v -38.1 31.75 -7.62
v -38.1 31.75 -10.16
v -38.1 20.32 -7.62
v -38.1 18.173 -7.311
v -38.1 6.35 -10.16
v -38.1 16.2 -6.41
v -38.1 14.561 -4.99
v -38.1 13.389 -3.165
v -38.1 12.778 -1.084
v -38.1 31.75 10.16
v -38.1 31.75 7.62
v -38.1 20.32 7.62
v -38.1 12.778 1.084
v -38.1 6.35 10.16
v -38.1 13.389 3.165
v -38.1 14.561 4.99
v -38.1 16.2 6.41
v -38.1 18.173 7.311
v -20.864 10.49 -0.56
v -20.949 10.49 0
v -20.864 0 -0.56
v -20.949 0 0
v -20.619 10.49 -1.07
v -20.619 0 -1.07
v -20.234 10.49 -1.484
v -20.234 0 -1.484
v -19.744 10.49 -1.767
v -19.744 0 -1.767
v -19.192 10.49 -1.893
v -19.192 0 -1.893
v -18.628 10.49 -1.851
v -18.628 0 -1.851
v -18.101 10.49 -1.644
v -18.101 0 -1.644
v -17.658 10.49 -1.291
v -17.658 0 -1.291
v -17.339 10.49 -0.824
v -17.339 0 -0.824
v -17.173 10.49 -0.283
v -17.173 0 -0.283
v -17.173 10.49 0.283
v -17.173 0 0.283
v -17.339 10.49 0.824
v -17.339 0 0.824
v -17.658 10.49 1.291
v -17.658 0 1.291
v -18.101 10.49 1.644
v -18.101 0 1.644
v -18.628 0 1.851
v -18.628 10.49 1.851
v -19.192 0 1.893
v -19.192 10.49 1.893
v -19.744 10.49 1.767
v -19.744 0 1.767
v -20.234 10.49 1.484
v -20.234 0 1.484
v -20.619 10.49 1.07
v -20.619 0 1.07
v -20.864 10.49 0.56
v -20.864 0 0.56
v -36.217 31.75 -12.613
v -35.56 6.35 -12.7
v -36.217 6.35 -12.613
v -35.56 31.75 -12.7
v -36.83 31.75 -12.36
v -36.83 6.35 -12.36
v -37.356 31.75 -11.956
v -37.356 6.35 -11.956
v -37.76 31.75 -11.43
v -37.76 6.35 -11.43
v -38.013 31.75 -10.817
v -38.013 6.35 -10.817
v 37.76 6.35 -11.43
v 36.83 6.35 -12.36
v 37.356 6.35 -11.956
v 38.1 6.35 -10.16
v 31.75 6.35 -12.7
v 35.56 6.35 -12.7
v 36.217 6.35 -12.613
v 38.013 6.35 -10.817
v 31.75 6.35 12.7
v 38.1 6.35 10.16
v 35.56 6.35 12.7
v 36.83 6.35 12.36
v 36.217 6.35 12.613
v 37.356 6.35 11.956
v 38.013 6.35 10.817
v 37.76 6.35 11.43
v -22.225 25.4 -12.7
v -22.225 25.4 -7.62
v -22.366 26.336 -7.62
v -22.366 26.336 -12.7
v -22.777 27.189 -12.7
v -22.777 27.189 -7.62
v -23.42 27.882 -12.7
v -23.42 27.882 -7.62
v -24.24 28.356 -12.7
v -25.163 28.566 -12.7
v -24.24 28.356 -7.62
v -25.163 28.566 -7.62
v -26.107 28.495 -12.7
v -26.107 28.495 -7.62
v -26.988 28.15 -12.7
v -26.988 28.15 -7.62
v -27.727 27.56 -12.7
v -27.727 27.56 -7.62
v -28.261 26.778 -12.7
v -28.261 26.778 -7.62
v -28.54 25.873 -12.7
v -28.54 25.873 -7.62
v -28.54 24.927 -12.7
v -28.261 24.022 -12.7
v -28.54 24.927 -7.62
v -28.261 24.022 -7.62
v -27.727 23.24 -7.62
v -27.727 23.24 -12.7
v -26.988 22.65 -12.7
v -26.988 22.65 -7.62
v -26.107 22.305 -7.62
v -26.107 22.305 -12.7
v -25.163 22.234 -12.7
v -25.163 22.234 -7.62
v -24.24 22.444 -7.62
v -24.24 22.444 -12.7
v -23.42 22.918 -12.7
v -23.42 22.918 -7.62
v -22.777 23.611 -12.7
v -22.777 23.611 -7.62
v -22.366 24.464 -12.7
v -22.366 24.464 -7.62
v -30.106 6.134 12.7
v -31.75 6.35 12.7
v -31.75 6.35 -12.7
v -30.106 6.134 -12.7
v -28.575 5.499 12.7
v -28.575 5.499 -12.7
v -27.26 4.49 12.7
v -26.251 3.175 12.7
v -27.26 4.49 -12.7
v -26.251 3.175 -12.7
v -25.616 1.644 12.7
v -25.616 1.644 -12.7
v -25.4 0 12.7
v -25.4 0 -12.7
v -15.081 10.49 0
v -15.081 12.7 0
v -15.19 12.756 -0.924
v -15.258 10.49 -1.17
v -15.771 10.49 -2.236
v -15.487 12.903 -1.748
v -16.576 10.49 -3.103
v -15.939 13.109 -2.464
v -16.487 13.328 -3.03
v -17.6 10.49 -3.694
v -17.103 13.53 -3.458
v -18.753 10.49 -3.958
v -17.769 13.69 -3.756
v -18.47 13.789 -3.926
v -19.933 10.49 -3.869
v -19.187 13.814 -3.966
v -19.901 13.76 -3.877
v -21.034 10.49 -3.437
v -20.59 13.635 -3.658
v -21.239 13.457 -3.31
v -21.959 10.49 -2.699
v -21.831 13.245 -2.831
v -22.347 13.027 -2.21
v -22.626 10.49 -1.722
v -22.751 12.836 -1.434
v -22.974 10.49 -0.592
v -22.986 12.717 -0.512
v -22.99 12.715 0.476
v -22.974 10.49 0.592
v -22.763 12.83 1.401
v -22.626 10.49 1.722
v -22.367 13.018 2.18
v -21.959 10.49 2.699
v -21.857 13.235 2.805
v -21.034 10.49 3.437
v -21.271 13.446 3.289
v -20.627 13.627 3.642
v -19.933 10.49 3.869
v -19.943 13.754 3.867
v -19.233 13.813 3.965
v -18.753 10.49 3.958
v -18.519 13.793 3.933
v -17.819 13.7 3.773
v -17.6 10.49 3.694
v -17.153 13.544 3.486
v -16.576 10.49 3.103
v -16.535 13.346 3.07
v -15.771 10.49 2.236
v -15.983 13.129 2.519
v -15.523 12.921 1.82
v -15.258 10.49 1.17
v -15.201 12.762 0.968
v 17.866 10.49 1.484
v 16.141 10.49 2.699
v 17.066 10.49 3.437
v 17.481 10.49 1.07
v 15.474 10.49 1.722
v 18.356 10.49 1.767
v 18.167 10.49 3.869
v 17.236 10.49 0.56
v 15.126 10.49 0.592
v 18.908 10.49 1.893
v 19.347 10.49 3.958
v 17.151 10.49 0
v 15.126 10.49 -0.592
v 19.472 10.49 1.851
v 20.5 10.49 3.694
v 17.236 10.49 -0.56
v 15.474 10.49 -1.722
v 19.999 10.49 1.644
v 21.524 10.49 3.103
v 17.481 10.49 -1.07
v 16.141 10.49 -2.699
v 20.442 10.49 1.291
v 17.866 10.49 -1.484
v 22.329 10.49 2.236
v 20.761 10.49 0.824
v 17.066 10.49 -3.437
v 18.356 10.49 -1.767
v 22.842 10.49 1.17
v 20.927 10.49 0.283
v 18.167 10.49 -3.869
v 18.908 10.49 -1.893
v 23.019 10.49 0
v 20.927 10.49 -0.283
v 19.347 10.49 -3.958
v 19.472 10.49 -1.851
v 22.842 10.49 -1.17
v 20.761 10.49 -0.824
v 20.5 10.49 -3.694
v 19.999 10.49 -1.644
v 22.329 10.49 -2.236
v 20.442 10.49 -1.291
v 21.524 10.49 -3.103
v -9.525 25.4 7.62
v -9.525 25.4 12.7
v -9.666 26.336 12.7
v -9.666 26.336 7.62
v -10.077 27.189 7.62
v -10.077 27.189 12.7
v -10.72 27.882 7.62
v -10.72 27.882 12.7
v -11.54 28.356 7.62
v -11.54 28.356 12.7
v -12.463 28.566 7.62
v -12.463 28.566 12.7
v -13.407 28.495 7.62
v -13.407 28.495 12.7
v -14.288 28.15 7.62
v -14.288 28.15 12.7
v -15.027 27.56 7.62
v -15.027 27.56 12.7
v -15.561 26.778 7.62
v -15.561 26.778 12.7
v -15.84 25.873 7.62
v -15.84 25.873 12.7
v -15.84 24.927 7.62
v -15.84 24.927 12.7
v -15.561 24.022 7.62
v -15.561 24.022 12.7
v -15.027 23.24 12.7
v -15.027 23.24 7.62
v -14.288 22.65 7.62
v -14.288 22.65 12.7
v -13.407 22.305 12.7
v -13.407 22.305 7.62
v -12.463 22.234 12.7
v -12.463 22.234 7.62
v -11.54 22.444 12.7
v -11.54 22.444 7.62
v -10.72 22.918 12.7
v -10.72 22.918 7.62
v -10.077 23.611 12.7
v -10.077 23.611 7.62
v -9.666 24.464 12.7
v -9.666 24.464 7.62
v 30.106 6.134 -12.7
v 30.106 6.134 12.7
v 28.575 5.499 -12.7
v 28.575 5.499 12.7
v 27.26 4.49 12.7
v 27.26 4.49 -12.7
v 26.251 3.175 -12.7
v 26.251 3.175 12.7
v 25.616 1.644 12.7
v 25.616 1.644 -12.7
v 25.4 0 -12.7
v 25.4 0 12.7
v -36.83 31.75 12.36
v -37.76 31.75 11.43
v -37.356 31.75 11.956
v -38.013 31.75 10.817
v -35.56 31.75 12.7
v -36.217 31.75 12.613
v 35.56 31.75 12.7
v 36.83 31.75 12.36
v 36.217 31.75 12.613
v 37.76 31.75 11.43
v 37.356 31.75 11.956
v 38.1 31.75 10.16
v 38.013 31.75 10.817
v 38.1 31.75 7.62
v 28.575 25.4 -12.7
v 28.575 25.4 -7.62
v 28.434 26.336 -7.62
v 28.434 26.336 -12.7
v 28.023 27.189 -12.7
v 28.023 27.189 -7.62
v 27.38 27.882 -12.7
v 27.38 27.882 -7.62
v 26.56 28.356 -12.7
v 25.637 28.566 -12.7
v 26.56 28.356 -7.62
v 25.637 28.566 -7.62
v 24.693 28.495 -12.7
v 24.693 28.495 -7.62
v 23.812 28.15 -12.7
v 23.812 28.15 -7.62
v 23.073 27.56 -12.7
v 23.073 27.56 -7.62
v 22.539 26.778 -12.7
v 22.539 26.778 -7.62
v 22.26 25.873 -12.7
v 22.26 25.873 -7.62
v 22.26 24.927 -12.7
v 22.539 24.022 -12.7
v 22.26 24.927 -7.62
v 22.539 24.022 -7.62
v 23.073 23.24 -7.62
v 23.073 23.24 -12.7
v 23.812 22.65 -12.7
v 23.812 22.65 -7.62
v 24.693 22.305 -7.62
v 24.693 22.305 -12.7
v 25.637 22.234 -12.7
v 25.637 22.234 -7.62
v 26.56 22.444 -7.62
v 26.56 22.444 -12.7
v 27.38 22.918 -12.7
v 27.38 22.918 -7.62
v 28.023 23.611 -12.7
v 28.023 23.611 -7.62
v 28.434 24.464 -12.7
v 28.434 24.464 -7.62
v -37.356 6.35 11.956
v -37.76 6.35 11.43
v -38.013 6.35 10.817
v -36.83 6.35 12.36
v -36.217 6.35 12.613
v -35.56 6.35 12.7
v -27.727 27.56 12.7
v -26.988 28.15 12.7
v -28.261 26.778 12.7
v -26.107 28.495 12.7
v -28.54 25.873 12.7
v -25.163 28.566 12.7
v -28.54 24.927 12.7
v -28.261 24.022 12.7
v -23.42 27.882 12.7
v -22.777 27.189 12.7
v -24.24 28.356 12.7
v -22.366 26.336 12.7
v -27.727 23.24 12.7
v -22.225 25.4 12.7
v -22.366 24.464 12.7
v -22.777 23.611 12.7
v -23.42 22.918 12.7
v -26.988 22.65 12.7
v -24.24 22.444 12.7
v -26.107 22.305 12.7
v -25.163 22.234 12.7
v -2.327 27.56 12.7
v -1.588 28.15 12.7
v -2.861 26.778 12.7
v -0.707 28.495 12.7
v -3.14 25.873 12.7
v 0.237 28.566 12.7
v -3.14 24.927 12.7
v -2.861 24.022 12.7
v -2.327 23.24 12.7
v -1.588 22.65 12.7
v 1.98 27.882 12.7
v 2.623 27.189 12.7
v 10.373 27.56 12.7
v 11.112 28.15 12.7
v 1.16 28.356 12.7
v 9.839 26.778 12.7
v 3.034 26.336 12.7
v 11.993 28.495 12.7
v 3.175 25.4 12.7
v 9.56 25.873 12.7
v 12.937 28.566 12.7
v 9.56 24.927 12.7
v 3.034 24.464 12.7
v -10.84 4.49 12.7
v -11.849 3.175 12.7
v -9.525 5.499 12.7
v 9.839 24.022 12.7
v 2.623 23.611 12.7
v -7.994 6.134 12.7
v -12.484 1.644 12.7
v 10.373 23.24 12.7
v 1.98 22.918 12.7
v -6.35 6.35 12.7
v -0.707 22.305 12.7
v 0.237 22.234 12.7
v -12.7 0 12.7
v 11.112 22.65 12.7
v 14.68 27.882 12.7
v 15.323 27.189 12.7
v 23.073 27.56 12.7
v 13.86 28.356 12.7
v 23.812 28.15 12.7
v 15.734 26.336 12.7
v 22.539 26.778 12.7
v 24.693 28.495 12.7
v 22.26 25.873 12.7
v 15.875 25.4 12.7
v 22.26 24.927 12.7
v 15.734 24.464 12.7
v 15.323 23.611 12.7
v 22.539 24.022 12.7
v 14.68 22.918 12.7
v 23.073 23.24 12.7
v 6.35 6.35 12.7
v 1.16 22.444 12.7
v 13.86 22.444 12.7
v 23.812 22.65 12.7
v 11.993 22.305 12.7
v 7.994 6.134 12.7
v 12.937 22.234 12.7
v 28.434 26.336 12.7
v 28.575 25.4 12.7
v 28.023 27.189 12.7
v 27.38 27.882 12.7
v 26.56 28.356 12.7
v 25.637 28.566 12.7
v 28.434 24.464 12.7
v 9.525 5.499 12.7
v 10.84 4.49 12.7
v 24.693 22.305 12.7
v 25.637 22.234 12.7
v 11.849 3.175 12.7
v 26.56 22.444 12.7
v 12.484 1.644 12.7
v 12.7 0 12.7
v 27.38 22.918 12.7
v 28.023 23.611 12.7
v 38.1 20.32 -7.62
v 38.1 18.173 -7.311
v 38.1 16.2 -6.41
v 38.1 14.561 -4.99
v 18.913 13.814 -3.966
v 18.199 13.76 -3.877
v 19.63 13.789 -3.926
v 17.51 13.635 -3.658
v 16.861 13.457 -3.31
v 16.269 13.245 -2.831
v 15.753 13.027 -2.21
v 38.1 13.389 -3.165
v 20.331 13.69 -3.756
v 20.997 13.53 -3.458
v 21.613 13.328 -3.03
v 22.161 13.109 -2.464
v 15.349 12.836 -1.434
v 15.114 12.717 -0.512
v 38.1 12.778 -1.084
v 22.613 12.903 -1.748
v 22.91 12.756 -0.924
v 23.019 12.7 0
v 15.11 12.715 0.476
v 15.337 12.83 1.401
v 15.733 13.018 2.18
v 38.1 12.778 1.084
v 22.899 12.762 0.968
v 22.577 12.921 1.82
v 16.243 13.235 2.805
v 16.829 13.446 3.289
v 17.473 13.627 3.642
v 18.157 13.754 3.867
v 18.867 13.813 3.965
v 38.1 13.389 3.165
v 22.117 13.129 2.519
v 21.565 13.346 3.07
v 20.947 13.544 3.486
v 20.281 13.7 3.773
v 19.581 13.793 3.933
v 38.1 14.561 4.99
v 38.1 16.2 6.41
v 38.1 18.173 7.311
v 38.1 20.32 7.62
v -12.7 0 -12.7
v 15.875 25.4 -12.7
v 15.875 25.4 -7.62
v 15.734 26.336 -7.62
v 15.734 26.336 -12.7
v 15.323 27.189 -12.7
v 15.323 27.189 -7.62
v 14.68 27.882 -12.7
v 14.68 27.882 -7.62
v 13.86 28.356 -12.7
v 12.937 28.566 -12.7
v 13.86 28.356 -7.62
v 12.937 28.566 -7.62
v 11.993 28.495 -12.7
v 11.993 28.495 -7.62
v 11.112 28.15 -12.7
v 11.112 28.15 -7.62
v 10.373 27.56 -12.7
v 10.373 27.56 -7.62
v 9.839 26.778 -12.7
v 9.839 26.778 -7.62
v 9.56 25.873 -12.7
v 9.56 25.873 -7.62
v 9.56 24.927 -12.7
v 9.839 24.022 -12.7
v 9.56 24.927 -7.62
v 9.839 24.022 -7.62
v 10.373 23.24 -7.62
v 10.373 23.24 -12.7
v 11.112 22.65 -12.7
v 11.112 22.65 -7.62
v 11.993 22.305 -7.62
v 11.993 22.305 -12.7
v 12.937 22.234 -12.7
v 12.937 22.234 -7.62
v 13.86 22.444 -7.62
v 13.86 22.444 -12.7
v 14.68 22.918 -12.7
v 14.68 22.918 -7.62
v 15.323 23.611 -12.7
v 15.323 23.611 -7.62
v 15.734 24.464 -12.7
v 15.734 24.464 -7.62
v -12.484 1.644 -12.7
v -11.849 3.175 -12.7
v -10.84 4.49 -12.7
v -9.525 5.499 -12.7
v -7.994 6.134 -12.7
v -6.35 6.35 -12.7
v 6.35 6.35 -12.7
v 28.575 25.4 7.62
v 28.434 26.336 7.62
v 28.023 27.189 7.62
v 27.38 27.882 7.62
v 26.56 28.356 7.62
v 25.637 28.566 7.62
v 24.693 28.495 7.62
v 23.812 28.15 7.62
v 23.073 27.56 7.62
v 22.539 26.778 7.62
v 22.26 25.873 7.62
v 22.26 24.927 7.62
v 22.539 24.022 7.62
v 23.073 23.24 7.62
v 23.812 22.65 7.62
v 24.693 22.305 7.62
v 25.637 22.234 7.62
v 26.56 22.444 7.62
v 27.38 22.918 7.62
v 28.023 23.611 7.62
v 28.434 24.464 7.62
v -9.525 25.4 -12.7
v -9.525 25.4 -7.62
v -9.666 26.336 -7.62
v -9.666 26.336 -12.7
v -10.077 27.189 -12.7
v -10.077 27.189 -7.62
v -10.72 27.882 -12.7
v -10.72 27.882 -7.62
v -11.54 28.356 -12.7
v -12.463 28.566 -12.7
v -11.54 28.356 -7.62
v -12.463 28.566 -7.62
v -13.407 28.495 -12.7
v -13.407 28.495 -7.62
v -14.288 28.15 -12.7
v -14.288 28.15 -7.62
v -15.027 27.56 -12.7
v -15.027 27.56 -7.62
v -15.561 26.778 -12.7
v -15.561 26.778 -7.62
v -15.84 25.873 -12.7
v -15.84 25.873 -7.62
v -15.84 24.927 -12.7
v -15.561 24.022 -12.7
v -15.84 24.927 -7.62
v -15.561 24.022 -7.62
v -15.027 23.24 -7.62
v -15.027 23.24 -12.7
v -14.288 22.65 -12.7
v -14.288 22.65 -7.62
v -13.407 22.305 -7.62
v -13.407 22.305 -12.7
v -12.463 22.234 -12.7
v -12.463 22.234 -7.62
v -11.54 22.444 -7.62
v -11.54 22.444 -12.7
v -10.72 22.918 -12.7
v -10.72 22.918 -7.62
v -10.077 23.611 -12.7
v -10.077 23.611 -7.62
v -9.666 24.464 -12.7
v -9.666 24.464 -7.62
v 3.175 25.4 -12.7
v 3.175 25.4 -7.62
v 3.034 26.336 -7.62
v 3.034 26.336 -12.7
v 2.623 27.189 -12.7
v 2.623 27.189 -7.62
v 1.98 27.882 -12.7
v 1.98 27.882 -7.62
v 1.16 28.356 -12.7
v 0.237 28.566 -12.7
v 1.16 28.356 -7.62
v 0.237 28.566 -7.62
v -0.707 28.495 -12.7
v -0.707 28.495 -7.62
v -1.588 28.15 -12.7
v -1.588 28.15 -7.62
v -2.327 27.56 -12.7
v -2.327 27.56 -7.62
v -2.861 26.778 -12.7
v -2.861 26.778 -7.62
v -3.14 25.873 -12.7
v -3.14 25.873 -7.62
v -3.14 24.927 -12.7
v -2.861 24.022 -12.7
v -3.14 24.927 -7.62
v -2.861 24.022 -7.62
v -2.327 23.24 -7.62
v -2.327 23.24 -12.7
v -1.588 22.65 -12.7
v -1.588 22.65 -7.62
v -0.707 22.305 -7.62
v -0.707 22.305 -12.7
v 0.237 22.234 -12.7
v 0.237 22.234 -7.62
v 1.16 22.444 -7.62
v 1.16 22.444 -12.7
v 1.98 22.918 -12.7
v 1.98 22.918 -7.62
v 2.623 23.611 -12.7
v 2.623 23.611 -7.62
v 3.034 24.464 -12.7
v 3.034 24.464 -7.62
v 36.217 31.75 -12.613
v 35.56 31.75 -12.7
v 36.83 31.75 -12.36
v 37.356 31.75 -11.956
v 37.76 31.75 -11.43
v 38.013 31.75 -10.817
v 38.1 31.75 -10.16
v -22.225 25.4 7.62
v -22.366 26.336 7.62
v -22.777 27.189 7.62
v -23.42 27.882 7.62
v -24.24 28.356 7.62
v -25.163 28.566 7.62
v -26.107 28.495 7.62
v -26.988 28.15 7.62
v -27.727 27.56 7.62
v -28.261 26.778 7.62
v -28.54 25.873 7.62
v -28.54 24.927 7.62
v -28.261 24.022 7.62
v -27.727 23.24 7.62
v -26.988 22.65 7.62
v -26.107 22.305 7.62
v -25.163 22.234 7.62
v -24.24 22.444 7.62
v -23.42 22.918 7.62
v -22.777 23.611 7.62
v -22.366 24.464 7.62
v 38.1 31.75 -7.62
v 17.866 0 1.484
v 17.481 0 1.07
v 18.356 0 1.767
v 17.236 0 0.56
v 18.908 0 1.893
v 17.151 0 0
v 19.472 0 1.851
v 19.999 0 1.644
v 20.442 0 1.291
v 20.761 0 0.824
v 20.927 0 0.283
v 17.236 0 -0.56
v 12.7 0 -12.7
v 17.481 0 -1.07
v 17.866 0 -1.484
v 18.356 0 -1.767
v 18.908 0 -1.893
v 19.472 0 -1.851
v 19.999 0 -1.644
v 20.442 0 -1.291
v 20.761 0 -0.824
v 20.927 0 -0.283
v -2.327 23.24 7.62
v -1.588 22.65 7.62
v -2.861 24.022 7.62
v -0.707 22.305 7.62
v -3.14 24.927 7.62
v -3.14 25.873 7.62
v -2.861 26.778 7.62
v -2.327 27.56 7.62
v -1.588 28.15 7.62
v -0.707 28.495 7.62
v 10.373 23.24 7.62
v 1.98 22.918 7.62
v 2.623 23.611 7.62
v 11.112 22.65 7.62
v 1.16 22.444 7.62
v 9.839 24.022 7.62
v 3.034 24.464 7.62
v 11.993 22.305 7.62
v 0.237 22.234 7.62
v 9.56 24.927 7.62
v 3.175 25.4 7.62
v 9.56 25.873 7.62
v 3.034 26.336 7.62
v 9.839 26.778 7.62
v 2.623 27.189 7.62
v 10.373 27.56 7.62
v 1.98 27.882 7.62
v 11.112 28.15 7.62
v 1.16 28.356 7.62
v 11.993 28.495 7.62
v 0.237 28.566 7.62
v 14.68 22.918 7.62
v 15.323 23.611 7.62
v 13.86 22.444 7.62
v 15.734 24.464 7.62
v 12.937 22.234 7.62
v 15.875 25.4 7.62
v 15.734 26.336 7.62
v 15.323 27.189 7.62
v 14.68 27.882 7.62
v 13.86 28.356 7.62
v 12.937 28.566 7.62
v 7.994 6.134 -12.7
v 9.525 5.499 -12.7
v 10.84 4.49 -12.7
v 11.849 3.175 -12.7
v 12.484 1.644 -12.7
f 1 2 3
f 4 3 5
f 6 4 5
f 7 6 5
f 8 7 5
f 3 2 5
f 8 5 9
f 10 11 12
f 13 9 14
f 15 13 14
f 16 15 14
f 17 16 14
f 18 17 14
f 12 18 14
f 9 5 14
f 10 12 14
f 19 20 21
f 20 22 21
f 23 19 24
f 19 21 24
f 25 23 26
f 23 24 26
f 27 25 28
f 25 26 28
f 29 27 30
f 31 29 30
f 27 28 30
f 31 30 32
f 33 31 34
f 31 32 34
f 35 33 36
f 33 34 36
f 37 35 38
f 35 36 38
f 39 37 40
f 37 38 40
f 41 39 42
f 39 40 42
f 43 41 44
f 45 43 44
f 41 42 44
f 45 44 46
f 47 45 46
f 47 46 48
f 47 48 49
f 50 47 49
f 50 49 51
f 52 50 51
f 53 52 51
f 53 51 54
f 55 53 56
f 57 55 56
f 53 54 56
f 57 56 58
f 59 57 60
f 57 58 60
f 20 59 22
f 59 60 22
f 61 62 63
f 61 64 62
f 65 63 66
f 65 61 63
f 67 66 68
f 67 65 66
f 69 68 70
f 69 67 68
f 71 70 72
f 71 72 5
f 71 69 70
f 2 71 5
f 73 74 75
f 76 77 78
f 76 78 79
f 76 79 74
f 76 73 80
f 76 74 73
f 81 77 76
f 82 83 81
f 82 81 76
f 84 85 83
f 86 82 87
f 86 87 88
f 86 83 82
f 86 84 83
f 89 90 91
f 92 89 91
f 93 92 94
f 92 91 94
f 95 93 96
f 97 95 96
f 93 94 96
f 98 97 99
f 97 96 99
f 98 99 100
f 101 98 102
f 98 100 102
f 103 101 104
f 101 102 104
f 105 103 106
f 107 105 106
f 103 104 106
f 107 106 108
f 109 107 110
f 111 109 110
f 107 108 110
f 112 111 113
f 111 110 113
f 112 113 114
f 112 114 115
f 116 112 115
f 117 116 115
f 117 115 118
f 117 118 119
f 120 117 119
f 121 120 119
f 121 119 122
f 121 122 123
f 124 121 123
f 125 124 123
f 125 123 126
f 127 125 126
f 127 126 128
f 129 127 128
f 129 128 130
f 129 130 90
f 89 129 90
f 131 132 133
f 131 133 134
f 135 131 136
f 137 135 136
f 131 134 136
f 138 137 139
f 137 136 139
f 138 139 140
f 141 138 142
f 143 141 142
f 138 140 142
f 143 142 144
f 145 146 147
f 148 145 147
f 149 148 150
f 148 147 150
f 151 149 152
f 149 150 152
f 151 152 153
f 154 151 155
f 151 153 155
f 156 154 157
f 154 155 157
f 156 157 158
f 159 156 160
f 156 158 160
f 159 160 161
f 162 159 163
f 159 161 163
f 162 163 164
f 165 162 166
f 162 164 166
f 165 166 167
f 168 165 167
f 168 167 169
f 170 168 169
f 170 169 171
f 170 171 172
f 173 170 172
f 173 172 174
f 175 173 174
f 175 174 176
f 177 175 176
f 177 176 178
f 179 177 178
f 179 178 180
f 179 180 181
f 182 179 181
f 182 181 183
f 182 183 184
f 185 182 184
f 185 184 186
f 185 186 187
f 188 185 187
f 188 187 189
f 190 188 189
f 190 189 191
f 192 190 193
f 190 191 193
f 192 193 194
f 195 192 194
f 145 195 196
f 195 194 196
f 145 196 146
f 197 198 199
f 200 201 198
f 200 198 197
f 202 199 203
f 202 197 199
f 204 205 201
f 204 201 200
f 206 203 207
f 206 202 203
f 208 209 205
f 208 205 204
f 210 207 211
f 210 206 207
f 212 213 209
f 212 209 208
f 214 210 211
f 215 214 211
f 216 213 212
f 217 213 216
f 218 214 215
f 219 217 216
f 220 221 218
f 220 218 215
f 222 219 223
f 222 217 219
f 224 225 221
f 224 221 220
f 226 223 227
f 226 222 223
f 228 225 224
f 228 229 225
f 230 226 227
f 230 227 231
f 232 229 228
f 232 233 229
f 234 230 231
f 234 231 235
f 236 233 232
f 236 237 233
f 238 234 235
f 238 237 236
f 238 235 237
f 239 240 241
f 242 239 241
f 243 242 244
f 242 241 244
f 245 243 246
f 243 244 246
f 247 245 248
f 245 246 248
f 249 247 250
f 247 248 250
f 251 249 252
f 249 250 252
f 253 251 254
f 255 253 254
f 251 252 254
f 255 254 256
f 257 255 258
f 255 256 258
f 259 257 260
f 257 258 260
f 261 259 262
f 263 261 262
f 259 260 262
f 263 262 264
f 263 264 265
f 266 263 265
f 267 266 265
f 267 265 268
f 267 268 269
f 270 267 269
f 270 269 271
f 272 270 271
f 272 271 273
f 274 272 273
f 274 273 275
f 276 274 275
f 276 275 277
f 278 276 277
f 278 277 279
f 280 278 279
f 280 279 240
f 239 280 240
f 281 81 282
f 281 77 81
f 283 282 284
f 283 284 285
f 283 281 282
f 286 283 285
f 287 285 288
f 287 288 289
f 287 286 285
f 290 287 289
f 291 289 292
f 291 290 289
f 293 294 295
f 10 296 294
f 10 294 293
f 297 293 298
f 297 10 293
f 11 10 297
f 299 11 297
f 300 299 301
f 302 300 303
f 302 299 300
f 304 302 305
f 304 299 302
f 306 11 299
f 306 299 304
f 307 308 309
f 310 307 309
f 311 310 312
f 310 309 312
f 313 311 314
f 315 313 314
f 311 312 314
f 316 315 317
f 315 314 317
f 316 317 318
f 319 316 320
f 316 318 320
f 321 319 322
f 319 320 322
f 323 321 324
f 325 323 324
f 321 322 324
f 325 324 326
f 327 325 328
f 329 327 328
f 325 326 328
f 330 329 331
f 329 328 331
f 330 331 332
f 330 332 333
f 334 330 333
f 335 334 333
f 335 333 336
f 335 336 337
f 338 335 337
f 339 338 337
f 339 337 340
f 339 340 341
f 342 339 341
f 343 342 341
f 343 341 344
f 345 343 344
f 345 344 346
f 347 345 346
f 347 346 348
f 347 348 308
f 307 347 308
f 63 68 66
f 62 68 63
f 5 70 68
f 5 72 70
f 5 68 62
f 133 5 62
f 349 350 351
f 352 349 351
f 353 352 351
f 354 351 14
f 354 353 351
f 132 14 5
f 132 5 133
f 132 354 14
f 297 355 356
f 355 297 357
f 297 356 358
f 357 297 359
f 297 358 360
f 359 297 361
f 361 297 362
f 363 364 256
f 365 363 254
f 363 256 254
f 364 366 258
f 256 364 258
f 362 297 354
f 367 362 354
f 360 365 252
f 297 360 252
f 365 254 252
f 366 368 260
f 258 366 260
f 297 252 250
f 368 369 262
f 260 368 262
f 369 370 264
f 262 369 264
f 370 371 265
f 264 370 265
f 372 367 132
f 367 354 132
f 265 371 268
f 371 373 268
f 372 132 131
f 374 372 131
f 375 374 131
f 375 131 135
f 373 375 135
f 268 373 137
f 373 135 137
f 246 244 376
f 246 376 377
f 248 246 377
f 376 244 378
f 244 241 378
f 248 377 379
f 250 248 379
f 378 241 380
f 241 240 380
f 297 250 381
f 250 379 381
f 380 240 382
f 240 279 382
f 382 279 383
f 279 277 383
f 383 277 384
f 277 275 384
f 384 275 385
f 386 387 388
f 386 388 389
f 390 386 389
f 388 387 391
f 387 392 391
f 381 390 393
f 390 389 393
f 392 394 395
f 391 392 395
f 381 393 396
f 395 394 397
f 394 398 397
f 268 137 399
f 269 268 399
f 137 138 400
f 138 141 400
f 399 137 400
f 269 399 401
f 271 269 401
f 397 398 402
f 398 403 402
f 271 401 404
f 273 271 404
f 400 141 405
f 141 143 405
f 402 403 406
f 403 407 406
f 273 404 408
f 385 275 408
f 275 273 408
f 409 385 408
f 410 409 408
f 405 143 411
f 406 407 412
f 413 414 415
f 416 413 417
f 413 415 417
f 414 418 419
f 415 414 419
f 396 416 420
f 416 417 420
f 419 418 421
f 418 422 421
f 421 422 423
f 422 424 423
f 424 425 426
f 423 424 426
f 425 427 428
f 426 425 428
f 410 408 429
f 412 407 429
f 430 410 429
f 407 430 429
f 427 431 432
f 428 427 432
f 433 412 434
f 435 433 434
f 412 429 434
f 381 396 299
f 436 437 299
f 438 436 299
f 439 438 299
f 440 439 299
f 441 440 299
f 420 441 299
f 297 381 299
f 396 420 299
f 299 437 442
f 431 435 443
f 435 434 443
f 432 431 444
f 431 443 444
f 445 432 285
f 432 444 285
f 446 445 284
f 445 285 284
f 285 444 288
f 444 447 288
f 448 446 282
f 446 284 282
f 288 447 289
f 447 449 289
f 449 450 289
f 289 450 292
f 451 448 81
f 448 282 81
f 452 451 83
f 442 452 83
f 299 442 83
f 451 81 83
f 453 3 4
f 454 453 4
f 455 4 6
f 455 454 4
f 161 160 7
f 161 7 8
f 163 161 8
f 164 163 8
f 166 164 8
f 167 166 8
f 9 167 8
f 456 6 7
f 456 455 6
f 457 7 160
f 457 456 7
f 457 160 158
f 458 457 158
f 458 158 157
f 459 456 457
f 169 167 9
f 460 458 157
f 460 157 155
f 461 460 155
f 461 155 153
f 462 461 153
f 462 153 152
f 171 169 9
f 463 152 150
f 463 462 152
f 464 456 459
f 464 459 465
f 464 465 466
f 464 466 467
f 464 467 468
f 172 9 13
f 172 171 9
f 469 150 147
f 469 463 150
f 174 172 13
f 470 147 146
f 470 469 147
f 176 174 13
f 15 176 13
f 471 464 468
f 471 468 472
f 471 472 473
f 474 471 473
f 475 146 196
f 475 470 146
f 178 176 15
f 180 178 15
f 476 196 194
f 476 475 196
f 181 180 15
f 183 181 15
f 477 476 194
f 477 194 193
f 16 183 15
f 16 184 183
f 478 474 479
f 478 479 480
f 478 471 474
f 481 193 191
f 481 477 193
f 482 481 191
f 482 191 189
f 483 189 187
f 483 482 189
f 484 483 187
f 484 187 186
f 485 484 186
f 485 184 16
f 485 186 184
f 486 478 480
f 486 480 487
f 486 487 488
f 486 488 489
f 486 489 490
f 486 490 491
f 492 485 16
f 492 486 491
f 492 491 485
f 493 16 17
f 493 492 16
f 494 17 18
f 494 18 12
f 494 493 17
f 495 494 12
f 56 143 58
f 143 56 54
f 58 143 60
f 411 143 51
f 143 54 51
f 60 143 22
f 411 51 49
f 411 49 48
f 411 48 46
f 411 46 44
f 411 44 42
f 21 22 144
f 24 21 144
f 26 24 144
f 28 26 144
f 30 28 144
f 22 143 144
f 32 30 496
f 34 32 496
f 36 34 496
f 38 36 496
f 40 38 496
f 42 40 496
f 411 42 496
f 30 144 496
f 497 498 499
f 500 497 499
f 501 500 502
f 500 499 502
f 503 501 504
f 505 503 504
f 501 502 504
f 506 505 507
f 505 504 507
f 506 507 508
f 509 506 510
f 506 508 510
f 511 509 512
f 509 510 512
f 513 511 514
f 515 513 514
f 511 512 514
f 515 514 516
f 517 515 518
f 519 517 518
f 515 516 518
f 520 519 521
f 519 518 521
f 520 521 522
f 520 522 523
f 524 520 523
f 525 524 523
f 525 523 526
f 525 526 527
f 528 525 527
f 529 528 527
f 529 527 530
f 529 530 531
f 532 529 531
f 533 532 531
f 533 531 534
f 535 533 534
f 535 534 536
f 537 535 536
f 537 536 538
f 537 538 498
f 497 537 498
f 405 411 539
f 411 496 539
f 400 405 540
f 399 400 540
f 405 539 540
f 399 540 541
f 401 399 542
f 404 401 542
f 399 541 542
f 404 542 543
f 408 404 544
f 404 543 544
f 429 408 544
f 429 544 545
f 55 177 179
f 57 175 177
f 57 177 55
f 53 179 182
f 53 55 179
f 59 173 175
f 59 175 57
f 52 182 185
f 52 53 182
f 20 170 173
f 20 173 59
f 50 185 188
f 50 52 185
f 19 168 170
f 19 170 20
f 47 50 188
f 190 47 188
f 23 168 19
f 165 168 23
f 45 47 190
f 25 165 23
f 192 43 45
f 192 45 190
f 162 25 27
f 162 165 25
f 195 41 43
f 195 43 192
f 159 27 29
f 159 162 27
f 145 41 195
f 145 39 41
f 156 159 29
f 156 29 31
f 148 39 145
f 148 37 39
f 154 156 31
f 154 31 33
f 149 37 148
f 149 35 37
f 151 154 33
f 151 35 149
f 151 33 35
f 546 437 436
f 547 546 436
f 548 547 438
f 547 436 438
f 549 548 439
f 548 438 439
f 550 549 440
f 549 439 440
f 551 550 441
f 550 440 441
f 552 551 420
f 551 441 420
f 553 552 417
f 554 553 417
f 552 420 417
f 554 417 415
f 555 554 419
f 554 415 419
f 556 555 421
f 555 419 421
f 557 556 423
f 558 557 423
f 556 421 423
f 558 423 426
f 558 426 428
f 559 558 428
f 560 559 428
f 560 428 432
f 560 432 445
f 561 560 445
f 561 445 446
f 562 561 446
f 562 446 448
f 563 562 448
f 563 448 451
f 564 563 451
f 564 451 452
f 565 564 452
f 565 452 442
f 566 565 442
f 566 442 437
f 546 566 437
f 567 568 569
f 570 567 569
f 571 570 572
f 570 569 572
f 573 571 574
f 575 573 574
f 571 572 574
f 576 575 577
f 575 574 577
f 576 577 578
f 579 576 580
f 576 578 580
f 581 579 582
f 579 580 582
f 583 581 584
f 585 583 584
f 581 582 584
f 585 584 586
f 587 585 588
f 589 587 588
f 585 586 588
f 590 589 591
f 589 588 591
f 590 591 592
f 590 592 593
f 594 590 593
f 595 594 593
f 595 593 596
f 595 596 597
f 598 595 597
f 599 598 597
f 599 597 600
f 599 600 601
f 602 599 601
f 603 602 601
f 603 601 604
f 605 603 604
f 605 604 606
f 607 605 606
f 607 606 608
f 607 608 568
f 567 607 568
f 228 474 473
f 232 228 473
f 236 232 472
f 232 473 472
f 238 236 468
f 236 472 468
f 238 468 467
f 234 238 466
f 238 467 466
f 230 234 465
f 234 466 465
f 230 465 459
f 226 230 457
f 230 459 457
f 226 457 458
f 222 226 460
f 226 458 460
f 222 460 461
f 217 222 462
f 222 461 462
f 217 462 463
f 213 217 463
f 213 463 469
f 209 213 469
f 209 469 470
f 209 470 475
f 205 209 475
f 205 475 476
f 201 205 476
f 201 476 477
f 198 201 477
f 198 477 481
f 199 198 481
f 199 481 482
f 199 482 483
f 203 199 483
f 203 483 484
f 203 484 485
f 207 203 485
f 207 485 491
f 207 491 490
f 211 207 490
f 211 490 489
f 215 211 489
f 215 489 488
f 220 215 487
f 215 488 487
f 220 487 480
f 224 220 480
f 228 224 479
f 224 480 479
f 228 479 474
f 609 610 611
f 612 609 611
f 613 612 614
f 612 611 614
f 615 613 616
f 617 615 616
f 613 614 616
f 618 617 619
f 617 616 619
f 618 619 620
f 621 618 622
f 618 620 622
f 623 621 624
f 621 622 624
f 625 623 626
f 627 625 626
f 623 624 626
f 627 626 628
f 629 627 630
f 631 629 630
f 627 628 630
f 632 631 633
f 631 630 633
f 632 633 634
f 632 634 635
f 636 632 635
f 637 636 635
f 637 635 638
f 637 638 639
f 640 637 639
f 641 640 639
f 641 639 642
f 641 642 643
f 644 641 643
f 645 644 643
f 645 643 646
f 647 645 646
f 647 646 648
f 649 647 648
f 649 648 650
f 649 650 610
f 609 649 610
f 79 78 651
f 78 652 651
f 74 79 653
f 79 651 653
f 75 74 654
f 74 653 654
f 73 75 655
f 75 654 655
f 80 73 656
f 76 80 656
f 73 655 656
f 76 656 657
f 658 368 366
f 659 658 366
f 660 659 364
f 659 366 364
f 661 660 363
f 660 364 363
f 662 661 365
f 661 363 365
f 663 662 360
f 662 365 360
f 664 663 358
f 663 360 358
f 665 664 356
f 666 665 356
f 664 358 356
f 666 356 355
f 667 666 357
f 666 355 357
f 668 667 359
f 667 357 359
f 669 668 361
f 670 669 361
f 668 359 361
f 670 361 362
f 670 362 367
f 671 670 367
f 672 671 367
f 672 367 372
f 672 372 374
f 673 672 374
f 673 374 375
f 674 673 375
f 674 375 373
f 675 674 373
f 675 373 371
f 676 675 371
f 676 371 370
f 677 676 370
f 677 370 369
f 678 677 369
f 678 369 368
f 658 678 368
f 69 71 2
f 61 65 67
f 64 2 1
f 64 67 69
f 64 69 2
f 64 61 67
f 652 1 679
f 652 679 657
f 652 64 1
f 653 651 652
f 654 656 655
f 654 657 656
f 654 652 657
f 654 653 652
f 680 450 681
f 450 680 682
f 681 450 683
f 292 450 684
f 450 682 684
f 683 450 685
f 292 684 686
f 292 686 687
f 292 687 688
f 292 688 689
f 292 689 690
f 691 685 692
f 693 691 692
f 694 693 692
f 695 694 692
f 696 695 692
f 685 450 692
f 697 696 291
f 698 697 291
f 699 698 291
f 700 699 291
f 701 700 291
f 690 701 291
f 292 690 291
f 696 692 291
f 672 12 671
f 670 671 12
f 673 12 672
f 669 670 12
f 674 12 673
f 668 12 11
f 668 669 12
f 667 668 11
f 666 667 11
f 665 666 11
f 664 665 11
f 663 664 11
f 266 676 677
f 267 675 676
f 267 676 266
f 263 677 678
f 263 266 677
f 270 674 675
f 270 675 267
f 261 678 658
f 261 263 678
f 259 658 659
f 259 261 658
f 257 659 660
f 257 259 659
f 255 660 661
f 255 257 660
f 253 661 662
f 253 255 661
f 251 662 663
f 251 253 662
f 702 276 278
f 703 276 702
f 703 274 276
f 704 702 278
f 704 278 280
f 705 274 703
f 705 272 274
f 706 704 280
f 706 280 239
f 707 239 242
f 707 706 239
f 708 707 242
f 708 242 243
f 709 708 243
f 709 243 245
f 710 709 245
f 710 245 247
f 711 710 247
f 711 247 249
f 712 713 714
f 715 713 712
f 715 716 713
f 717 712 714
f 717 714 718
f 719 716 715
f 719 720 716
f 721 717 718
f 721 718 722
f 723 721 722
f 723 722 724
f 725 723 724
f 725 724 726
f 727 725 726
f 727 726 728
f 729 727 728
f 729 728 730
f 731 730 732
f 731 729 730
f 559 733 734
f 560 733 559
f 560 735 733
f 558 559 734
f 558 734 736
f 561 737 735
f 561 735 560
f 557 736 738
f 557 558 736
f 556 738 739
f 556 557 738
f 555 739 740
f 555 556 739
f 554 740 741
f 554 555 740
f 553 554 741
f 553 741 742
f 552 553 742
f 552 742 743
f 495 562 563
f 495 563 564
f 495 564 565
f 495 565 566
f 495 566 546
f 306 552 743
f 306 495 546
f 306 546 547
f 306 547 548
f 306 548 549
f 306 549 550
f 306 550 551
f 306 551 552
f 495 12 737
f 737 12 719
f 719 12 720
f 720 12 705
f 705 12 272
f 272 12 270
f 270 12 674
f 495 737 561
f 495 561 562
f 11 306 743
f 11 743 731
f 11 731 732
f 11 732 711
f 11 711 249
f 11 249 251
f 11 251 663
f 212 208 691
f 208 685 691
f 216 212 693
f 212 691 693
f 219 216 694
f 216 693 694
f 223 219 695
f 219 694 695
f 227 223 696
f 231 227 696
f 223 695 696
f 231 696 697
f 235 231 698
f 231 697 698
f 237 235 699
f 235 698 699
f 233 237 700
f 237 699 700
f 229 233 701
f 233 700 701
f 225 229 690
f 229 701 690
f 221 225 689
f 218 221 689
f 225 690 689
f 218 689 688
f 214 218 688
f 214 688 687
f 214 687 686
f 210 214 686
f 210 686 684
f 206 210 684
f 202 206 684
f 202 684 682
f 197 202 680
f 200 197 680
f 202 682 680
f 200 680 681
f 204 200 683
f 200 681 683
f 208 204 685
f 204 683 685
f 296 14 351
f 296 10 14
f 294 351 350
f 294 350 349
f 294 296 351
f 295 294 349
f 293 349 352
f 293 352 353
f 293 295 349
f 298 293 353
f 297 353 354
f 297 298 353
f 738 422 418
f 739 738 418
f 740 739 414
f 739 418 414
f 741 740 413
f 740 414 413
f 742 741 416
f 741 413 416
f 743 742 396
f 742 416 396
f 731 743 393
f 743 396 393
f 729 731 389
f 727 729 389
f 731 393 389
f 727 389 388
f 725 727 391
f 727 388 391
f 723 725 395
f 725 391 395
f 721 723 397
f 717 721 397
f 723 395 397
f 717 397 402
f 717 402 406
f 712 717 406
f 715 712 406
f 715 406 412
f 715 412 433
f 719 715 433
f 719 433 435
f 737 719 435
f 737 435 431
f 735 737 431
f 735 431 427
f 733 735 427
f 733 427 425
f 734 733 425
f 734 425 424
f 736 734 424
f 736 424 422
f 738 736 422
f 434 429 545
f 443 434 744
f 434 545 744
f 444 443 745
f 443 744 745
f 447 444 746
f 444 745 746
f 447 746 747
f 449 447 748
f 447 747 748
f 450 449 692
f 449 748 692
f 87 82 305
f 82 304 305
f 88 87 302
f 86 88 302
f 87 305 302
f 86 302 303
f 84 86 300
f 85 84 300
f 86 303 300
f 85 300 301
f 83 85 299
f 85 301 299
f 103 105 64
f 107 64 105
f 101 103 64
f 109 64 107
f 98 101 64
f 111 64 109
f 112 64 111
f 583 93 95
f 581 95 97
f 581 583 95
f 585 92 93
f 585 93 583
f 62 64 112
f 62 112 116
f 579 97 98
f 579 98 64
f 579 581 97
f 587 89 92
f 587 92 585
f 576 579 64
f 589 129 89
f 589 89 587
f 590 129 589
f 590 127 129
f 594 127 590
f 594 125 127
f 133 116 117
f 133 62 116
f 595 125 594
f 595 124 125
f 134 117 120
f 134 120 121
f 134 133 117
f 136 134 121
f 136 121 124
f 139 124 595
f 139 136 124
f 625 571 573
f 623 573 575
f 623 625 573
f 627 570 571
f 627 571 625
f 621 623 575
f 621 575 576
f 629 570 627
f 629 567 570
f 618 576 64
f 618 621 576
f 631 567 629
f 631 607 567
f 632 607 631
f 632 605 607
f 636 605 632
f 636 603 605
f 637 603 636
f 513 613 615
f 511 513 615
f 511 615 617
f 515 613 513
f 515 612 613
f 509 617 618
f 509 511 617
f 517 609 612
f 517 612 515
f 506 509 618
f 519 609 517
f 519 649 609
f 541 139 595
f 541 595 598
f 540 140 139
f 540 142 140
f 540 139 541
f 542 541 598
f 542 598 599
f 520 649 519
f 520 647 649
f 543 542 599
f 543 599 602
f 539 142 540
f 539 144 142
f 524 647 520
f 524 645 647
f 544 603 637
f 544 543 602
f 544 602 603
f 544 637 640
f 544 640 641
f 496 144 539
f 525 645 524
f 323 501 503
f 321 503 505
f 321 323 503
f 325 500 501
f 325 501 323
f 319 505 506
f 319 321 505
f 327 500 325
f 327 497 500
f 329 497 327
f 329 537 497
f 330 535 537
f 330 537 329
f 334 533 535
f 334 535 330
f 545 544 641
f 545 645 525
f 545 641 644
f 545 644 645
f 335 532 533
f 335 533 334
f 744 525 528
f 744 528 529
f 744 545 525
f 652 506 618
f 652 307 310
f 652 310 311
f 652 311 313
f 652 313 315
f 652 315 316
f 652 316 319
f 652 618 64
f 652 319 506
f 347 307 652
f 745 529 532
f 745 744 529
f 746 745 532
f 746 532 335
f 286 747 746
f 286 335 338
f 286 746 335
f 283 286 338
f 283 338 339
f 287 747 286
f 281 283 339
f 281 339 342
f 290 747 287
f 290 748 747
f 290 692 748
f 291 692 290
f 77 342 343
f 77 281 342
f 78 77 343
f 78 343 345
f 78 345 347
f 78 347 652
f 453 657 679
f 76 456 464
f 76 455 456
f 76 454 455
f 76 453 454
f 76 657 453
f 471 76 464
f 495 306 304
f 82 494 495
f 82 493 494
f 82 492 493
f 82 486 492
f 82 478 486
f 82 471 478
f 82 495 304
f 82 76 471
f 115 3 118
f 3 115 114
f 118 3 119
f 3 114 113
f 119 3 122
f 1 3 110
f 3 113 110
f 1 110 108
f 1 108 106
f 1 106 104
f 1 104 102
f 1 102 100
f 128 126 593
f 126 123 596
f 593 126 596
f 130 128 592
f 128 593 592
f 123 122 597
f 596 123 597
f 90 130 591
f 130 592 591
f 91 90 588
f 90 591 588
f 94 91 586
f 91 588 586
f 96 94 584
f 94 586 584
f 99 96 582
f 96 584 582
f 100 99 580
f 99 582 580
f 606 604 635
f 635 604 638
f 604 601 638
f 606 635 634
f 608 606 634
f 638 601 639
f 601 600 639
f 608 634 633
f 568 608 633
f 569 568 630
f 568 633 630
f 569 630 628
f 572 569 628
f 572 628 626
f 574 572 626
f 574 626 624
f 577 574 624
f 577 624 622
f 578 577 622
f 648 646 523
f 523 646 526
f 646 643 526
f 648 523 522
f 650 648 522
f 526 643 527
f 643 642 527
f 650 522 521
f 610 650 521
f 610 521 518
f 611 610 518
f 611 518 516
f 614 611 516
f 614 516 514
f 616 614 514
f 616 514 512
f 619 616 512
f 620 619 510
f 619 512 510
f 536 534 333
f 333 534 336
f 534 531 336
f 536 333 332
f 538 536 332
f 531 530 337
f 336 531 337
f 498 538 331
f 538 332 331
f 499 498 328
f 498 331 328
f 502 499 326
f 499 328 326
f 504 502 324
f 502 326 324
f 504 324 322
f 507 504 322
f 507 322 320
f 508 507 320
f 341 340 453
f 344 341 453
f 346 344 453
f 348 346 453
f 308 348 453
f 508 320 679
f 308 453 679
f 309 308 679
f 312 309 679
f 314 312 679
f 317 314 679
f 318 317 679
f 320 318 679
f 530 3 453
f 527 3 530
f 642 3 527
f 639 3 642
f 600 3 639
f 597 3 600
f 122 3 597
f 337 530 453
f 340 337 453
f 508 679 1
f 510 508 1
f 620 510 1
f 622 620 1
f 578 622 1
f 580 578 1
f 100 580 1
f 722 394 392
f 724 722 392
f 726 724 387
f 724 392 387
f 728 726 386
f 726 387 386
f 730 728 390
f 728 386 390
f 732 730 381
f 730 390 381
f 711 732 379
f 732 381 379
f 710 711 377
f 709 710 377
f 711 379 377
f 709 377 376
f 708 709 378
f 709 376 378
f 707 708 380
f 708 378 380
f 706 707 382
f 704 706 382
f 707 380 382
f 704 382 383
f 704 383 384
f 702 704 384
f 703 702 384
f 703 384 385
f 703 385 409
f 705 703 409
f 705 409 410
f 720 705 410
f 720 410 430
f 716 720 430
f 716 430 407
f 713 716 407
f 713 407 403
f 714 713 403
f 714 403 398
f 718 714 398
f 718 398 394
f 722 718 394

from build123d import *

# Parameters (mm, degrees)
SKETCH1_W                                           = 76.2
SKETCH1_H                                           = 25.4
BOSS_EXTRUDE1_DEPTH                                 = 31.75
CUT_EXTRUDE1_REACH                                  = 85.521
SKETCH2_W                                           = 15.24
SKETCH2_H                                           = 19.05
SKETCH3_R                                           = 3.175
CUT_EXTRUDE2_DEPTH                                  = 56.72102386
LPATTERN1_COUNT                                     = 5
LPATTERN1_PITCH                                     = 12.7
CBORE_FOR_6_BINDING_HEAD_MACHINE_SCREW1_D           = 3.7973
CBORE_FOR_6_BINDING_HEAD_MACHINE_SCREW1_CBORE_D     = 7.9375
CBORE_FOR_6_BINDING_HEAD_MACHINE_SCREW1_CBORE_DEPTH = 2.2098
FILLET2_R                                           = 7.62
CUT_EXTRUDE3_REACH                                  = 57.721
SKETCH7_W                                           = 12.7
SKETCH7_H                                           = 6.35
SKETCH7_W_2                                         = 25.4
FILLET5_R                                           = 6.35
FILLET6_R                                           = 2.54


# Some blends are built 0.0001 mm under size
with BuildPart() as part:
    # Sketch1 → Boss-Extrude1 (new body)
    with BuildSketch(Plane(origin=(0, 0, 0), x_dir=(1, 0, 0), z_dir=(0, 1, 0))):
        Rectangle(SKETCH1_W, SKETCH1_H)
    extrude(amount=BOSS_EXTRUDE1_DEPTH)

    # Sketch2 → Cut-Extrude1 (cut, up to next)
    with BuildSketch(Plane(origin=(38.1, 0, 0), x_dir=(0, 0, -1), z_dir=(1, 0, 0)), mode=Mode.PRIVATE) as cut_extrude1_sk1:
        with Locations((0, 22.225)):
            Rectangle(SKETCH2_W, SKETCH2_H)
    cut_extrude1_tool1 = extrude(cut_extrude1_sk1.sketch, amount=-CUT_EXTRUDE1_REACH, mode=Mode.PRIVATE) & part.part
    add(cut_extrude1_tool1.solids().sort_by_distance((38.1, 22.225, 0))[0], mode=Mode.SUBTRACT)

    # Sketch3 → Cut-Extrude2 (cut, through all)
    with BuildSketch(Plane.XY.offset(12.7)):
        with Locations((-25.4, 25.4)):
            Circle(SKETCH3_R)
    cut_extrude2 = extrude(amount=-CUT_EXTRUDE2_DEPTH, mode=Mode.SUBTRACT)

    # LPattern1: Cut-Extrude2 ×5
    with Locations(*[(i * LPATTERN1_PITCH, 0, 0) for i in range(1, LPATTERN1_COUNT)]):
        add(cut_extrude2, mode=Mode.SUBTRACT)

    # CBORE for #6 Binding Head Machine Screw1 (through all)
    with Locations(Plane(origin=(0, 12.7, 0), x_dir=(1, 0, 0), z_dir=(0, 1, 0))):
        with Locations((-19.05, 0), (19.05, 0)):
            CounterBoreHole(CBORE_FOR_6_BINDING_HEAD_MACHINE_SCREW1_D / 2, CBORE_FOR_6_BINDING_HEAD_MACHINE_SCREW1_CBORE_D / 2, CBORE_FOR_6_BINDING_HEAD_MACHINE_SCREW1_CBORE_DEPTH)

    # Fillet2
    # the kernel refuses this fillet: 7.62 mm, written as the material it adds along each edge
    with BuildSketch(Plane(origin=(38.1, 12.7, -7.62), x_dir=(0, 1, 0), z_dir=(-1, 0, 0))) as fillet2_piece_1_section:
        with BuildLine():
            CenterArc((FILLET2_R, -FILLET2_R), FILLET2_R, 90, 90)
            Line((0, -FILLET2_R), (0, 0))
            Line((0, 0), (FILLET2_R, 0))
        make_face()
    fillet2_piece_1 = extrude(amount=76.2, mode=Mode.PRIVATE)
    fillet2_piece_1 = fillet2_piece_1 - Plane(origin=(-19.05, 14.454782772, 0), x_dir=(1, 0, 0), z_dir=(0, 1, 0)) * Cylinder(3.96875, 183, mode=Mode.PRIVATE)
    fillet2_piece_1 = fillet2_piece_1 - Plane(origin=(19.05, 14.454782772, 0), x_dir=(1, 0, 0), z_dir=(0, 1, 0)) * Cylinder(3.96875, 183, mode=Mode.PRIVATE)
    add(fillet2_piece_1)
    with BuildSketch(Plane(origin=(38.1, 12.7, 7.62), x_dir=(0, 0, -1), z_dir=(-1, 0, 0))) as fillet2_piece_2_section:
        with BuildLine():
            CenterArc((FILLET2_R, -FILLET2_R), FILLET2_R, 90, 90)
            Line((0, -FILLET2_R), (0, 0))
            Line((0, 0), (FILLET2_R, 0))
        make_face()
    fillet2_piece_2 = extrude(amount=76.2, mode=Mode.PRIVATE)
    fillet2_piece_2 = fillet2_piece_2 - Plane(origin=(-19.05, 14.454782936, 0), x_dir=(1, 0, 0), z_dir=(0, 1, 0)) * Cylinder(3.96875, 183, mode=Mode.PRIVATE)
    fillet2_piece_2 = fillet2_piece_2 - Plane(origin=(19.05, 14.454782936, 0), x_dir=(1, 0, 0), z_dir=(0, 1, 0)) * Cylinder(3.96875, 183, mode=Mode.PRIVATE)
    add(fillet2_piece_2)

    # Sketch7 → Cut-Extrude3 (cut, up to next)
    with BuildSketch(Plane.XY.offset(12.7), mode=Mode.PRIVATE) as cut_extrude3_sk1:
        with Locations((-31.75, 3.175)):
            Rectangle(SKETCH7_W, SKETCH7_H)
    cut_extrude3_tool1 = extrude(cut_extrude3_sk1.sketch, amount=-CUT_EXTRUDE3_REACH, mode=Mode.PRIVATE) & part.part
    # Sketch7 → Cut-Extrude3 (cut, up to next)
    with BuildSketch(Plane.XY.offset(12.7), mode=Mode.PRIVATE) as cut_extrude3_sk2:
        with Locations((31.75, 3.175)):
            Rectangle(SKETCH7_W, SKETCH7_H)
    cut_extrude3_tool2 = extrude(cut_extrude3_sk2.sketch, amount=-CUT_EXTRUDE3_REACH, mode=Mode.PRIVATE) & part.part
    # Sketch7 → Cut-Extrude3 (cut, up to next)
    with BuildSketch(Plane.XY.offset(12.7), mode=Mode.PRIVATE) as cut_extrude3_sk3:
        with Locations((0, 3.175)):
            Rectangle(SKETCH7_W_2, SKETCH7_H)
    cut_extrude3_tool3 = extrude(cut_extrude3_sk3.sketch, amount=-CUT_EXTRUDE3_REACH, mode=Mode.PRIVATE) & part.part
    add(cut_extrude3_tool1.solids().sort_by_distance((-31.75, 3.175, 12.7))[0], mode=Mode.SUBTRACT)
    add(cut_extrude3_tool2.solids().sort_by_distance((31.75, 3.175, 12.7))[0], mode=Mode.SUBTRACT)
    add(cut_extrude3_tool3.solids().sort_by_distance((0, 3.175, 12.7))[0], mode=Mode.SUBTRACT)

    # Fillet5
    fillet5_edges = [part.edges().sort_by_distance(p)[0] for p in [
        (-25.4, 6.35, 0),
        (-12.7, 6.35, 0),
        (12.7, 6.35, 0),
        (25.4, 6.35, 0),
    ]]
    fillet(fillet5_edges, radius=FILLET5_R - 0.0001)  # a hair under: the kernel refuses the full size

    # Fillet6
    fillet6_edges = [part.edges().sort_by_distance(p)[0] for p in [
        (-38.1, 19.05, -12.7),
        (38.1, 19.05, -12.7),
        (38.1, 19.05, 12.7),
        (-38.1, 19.05, 12.7),
    ]]
    fillet(fillet6_edges, radius=FILLET6_R)


solid = part.part
